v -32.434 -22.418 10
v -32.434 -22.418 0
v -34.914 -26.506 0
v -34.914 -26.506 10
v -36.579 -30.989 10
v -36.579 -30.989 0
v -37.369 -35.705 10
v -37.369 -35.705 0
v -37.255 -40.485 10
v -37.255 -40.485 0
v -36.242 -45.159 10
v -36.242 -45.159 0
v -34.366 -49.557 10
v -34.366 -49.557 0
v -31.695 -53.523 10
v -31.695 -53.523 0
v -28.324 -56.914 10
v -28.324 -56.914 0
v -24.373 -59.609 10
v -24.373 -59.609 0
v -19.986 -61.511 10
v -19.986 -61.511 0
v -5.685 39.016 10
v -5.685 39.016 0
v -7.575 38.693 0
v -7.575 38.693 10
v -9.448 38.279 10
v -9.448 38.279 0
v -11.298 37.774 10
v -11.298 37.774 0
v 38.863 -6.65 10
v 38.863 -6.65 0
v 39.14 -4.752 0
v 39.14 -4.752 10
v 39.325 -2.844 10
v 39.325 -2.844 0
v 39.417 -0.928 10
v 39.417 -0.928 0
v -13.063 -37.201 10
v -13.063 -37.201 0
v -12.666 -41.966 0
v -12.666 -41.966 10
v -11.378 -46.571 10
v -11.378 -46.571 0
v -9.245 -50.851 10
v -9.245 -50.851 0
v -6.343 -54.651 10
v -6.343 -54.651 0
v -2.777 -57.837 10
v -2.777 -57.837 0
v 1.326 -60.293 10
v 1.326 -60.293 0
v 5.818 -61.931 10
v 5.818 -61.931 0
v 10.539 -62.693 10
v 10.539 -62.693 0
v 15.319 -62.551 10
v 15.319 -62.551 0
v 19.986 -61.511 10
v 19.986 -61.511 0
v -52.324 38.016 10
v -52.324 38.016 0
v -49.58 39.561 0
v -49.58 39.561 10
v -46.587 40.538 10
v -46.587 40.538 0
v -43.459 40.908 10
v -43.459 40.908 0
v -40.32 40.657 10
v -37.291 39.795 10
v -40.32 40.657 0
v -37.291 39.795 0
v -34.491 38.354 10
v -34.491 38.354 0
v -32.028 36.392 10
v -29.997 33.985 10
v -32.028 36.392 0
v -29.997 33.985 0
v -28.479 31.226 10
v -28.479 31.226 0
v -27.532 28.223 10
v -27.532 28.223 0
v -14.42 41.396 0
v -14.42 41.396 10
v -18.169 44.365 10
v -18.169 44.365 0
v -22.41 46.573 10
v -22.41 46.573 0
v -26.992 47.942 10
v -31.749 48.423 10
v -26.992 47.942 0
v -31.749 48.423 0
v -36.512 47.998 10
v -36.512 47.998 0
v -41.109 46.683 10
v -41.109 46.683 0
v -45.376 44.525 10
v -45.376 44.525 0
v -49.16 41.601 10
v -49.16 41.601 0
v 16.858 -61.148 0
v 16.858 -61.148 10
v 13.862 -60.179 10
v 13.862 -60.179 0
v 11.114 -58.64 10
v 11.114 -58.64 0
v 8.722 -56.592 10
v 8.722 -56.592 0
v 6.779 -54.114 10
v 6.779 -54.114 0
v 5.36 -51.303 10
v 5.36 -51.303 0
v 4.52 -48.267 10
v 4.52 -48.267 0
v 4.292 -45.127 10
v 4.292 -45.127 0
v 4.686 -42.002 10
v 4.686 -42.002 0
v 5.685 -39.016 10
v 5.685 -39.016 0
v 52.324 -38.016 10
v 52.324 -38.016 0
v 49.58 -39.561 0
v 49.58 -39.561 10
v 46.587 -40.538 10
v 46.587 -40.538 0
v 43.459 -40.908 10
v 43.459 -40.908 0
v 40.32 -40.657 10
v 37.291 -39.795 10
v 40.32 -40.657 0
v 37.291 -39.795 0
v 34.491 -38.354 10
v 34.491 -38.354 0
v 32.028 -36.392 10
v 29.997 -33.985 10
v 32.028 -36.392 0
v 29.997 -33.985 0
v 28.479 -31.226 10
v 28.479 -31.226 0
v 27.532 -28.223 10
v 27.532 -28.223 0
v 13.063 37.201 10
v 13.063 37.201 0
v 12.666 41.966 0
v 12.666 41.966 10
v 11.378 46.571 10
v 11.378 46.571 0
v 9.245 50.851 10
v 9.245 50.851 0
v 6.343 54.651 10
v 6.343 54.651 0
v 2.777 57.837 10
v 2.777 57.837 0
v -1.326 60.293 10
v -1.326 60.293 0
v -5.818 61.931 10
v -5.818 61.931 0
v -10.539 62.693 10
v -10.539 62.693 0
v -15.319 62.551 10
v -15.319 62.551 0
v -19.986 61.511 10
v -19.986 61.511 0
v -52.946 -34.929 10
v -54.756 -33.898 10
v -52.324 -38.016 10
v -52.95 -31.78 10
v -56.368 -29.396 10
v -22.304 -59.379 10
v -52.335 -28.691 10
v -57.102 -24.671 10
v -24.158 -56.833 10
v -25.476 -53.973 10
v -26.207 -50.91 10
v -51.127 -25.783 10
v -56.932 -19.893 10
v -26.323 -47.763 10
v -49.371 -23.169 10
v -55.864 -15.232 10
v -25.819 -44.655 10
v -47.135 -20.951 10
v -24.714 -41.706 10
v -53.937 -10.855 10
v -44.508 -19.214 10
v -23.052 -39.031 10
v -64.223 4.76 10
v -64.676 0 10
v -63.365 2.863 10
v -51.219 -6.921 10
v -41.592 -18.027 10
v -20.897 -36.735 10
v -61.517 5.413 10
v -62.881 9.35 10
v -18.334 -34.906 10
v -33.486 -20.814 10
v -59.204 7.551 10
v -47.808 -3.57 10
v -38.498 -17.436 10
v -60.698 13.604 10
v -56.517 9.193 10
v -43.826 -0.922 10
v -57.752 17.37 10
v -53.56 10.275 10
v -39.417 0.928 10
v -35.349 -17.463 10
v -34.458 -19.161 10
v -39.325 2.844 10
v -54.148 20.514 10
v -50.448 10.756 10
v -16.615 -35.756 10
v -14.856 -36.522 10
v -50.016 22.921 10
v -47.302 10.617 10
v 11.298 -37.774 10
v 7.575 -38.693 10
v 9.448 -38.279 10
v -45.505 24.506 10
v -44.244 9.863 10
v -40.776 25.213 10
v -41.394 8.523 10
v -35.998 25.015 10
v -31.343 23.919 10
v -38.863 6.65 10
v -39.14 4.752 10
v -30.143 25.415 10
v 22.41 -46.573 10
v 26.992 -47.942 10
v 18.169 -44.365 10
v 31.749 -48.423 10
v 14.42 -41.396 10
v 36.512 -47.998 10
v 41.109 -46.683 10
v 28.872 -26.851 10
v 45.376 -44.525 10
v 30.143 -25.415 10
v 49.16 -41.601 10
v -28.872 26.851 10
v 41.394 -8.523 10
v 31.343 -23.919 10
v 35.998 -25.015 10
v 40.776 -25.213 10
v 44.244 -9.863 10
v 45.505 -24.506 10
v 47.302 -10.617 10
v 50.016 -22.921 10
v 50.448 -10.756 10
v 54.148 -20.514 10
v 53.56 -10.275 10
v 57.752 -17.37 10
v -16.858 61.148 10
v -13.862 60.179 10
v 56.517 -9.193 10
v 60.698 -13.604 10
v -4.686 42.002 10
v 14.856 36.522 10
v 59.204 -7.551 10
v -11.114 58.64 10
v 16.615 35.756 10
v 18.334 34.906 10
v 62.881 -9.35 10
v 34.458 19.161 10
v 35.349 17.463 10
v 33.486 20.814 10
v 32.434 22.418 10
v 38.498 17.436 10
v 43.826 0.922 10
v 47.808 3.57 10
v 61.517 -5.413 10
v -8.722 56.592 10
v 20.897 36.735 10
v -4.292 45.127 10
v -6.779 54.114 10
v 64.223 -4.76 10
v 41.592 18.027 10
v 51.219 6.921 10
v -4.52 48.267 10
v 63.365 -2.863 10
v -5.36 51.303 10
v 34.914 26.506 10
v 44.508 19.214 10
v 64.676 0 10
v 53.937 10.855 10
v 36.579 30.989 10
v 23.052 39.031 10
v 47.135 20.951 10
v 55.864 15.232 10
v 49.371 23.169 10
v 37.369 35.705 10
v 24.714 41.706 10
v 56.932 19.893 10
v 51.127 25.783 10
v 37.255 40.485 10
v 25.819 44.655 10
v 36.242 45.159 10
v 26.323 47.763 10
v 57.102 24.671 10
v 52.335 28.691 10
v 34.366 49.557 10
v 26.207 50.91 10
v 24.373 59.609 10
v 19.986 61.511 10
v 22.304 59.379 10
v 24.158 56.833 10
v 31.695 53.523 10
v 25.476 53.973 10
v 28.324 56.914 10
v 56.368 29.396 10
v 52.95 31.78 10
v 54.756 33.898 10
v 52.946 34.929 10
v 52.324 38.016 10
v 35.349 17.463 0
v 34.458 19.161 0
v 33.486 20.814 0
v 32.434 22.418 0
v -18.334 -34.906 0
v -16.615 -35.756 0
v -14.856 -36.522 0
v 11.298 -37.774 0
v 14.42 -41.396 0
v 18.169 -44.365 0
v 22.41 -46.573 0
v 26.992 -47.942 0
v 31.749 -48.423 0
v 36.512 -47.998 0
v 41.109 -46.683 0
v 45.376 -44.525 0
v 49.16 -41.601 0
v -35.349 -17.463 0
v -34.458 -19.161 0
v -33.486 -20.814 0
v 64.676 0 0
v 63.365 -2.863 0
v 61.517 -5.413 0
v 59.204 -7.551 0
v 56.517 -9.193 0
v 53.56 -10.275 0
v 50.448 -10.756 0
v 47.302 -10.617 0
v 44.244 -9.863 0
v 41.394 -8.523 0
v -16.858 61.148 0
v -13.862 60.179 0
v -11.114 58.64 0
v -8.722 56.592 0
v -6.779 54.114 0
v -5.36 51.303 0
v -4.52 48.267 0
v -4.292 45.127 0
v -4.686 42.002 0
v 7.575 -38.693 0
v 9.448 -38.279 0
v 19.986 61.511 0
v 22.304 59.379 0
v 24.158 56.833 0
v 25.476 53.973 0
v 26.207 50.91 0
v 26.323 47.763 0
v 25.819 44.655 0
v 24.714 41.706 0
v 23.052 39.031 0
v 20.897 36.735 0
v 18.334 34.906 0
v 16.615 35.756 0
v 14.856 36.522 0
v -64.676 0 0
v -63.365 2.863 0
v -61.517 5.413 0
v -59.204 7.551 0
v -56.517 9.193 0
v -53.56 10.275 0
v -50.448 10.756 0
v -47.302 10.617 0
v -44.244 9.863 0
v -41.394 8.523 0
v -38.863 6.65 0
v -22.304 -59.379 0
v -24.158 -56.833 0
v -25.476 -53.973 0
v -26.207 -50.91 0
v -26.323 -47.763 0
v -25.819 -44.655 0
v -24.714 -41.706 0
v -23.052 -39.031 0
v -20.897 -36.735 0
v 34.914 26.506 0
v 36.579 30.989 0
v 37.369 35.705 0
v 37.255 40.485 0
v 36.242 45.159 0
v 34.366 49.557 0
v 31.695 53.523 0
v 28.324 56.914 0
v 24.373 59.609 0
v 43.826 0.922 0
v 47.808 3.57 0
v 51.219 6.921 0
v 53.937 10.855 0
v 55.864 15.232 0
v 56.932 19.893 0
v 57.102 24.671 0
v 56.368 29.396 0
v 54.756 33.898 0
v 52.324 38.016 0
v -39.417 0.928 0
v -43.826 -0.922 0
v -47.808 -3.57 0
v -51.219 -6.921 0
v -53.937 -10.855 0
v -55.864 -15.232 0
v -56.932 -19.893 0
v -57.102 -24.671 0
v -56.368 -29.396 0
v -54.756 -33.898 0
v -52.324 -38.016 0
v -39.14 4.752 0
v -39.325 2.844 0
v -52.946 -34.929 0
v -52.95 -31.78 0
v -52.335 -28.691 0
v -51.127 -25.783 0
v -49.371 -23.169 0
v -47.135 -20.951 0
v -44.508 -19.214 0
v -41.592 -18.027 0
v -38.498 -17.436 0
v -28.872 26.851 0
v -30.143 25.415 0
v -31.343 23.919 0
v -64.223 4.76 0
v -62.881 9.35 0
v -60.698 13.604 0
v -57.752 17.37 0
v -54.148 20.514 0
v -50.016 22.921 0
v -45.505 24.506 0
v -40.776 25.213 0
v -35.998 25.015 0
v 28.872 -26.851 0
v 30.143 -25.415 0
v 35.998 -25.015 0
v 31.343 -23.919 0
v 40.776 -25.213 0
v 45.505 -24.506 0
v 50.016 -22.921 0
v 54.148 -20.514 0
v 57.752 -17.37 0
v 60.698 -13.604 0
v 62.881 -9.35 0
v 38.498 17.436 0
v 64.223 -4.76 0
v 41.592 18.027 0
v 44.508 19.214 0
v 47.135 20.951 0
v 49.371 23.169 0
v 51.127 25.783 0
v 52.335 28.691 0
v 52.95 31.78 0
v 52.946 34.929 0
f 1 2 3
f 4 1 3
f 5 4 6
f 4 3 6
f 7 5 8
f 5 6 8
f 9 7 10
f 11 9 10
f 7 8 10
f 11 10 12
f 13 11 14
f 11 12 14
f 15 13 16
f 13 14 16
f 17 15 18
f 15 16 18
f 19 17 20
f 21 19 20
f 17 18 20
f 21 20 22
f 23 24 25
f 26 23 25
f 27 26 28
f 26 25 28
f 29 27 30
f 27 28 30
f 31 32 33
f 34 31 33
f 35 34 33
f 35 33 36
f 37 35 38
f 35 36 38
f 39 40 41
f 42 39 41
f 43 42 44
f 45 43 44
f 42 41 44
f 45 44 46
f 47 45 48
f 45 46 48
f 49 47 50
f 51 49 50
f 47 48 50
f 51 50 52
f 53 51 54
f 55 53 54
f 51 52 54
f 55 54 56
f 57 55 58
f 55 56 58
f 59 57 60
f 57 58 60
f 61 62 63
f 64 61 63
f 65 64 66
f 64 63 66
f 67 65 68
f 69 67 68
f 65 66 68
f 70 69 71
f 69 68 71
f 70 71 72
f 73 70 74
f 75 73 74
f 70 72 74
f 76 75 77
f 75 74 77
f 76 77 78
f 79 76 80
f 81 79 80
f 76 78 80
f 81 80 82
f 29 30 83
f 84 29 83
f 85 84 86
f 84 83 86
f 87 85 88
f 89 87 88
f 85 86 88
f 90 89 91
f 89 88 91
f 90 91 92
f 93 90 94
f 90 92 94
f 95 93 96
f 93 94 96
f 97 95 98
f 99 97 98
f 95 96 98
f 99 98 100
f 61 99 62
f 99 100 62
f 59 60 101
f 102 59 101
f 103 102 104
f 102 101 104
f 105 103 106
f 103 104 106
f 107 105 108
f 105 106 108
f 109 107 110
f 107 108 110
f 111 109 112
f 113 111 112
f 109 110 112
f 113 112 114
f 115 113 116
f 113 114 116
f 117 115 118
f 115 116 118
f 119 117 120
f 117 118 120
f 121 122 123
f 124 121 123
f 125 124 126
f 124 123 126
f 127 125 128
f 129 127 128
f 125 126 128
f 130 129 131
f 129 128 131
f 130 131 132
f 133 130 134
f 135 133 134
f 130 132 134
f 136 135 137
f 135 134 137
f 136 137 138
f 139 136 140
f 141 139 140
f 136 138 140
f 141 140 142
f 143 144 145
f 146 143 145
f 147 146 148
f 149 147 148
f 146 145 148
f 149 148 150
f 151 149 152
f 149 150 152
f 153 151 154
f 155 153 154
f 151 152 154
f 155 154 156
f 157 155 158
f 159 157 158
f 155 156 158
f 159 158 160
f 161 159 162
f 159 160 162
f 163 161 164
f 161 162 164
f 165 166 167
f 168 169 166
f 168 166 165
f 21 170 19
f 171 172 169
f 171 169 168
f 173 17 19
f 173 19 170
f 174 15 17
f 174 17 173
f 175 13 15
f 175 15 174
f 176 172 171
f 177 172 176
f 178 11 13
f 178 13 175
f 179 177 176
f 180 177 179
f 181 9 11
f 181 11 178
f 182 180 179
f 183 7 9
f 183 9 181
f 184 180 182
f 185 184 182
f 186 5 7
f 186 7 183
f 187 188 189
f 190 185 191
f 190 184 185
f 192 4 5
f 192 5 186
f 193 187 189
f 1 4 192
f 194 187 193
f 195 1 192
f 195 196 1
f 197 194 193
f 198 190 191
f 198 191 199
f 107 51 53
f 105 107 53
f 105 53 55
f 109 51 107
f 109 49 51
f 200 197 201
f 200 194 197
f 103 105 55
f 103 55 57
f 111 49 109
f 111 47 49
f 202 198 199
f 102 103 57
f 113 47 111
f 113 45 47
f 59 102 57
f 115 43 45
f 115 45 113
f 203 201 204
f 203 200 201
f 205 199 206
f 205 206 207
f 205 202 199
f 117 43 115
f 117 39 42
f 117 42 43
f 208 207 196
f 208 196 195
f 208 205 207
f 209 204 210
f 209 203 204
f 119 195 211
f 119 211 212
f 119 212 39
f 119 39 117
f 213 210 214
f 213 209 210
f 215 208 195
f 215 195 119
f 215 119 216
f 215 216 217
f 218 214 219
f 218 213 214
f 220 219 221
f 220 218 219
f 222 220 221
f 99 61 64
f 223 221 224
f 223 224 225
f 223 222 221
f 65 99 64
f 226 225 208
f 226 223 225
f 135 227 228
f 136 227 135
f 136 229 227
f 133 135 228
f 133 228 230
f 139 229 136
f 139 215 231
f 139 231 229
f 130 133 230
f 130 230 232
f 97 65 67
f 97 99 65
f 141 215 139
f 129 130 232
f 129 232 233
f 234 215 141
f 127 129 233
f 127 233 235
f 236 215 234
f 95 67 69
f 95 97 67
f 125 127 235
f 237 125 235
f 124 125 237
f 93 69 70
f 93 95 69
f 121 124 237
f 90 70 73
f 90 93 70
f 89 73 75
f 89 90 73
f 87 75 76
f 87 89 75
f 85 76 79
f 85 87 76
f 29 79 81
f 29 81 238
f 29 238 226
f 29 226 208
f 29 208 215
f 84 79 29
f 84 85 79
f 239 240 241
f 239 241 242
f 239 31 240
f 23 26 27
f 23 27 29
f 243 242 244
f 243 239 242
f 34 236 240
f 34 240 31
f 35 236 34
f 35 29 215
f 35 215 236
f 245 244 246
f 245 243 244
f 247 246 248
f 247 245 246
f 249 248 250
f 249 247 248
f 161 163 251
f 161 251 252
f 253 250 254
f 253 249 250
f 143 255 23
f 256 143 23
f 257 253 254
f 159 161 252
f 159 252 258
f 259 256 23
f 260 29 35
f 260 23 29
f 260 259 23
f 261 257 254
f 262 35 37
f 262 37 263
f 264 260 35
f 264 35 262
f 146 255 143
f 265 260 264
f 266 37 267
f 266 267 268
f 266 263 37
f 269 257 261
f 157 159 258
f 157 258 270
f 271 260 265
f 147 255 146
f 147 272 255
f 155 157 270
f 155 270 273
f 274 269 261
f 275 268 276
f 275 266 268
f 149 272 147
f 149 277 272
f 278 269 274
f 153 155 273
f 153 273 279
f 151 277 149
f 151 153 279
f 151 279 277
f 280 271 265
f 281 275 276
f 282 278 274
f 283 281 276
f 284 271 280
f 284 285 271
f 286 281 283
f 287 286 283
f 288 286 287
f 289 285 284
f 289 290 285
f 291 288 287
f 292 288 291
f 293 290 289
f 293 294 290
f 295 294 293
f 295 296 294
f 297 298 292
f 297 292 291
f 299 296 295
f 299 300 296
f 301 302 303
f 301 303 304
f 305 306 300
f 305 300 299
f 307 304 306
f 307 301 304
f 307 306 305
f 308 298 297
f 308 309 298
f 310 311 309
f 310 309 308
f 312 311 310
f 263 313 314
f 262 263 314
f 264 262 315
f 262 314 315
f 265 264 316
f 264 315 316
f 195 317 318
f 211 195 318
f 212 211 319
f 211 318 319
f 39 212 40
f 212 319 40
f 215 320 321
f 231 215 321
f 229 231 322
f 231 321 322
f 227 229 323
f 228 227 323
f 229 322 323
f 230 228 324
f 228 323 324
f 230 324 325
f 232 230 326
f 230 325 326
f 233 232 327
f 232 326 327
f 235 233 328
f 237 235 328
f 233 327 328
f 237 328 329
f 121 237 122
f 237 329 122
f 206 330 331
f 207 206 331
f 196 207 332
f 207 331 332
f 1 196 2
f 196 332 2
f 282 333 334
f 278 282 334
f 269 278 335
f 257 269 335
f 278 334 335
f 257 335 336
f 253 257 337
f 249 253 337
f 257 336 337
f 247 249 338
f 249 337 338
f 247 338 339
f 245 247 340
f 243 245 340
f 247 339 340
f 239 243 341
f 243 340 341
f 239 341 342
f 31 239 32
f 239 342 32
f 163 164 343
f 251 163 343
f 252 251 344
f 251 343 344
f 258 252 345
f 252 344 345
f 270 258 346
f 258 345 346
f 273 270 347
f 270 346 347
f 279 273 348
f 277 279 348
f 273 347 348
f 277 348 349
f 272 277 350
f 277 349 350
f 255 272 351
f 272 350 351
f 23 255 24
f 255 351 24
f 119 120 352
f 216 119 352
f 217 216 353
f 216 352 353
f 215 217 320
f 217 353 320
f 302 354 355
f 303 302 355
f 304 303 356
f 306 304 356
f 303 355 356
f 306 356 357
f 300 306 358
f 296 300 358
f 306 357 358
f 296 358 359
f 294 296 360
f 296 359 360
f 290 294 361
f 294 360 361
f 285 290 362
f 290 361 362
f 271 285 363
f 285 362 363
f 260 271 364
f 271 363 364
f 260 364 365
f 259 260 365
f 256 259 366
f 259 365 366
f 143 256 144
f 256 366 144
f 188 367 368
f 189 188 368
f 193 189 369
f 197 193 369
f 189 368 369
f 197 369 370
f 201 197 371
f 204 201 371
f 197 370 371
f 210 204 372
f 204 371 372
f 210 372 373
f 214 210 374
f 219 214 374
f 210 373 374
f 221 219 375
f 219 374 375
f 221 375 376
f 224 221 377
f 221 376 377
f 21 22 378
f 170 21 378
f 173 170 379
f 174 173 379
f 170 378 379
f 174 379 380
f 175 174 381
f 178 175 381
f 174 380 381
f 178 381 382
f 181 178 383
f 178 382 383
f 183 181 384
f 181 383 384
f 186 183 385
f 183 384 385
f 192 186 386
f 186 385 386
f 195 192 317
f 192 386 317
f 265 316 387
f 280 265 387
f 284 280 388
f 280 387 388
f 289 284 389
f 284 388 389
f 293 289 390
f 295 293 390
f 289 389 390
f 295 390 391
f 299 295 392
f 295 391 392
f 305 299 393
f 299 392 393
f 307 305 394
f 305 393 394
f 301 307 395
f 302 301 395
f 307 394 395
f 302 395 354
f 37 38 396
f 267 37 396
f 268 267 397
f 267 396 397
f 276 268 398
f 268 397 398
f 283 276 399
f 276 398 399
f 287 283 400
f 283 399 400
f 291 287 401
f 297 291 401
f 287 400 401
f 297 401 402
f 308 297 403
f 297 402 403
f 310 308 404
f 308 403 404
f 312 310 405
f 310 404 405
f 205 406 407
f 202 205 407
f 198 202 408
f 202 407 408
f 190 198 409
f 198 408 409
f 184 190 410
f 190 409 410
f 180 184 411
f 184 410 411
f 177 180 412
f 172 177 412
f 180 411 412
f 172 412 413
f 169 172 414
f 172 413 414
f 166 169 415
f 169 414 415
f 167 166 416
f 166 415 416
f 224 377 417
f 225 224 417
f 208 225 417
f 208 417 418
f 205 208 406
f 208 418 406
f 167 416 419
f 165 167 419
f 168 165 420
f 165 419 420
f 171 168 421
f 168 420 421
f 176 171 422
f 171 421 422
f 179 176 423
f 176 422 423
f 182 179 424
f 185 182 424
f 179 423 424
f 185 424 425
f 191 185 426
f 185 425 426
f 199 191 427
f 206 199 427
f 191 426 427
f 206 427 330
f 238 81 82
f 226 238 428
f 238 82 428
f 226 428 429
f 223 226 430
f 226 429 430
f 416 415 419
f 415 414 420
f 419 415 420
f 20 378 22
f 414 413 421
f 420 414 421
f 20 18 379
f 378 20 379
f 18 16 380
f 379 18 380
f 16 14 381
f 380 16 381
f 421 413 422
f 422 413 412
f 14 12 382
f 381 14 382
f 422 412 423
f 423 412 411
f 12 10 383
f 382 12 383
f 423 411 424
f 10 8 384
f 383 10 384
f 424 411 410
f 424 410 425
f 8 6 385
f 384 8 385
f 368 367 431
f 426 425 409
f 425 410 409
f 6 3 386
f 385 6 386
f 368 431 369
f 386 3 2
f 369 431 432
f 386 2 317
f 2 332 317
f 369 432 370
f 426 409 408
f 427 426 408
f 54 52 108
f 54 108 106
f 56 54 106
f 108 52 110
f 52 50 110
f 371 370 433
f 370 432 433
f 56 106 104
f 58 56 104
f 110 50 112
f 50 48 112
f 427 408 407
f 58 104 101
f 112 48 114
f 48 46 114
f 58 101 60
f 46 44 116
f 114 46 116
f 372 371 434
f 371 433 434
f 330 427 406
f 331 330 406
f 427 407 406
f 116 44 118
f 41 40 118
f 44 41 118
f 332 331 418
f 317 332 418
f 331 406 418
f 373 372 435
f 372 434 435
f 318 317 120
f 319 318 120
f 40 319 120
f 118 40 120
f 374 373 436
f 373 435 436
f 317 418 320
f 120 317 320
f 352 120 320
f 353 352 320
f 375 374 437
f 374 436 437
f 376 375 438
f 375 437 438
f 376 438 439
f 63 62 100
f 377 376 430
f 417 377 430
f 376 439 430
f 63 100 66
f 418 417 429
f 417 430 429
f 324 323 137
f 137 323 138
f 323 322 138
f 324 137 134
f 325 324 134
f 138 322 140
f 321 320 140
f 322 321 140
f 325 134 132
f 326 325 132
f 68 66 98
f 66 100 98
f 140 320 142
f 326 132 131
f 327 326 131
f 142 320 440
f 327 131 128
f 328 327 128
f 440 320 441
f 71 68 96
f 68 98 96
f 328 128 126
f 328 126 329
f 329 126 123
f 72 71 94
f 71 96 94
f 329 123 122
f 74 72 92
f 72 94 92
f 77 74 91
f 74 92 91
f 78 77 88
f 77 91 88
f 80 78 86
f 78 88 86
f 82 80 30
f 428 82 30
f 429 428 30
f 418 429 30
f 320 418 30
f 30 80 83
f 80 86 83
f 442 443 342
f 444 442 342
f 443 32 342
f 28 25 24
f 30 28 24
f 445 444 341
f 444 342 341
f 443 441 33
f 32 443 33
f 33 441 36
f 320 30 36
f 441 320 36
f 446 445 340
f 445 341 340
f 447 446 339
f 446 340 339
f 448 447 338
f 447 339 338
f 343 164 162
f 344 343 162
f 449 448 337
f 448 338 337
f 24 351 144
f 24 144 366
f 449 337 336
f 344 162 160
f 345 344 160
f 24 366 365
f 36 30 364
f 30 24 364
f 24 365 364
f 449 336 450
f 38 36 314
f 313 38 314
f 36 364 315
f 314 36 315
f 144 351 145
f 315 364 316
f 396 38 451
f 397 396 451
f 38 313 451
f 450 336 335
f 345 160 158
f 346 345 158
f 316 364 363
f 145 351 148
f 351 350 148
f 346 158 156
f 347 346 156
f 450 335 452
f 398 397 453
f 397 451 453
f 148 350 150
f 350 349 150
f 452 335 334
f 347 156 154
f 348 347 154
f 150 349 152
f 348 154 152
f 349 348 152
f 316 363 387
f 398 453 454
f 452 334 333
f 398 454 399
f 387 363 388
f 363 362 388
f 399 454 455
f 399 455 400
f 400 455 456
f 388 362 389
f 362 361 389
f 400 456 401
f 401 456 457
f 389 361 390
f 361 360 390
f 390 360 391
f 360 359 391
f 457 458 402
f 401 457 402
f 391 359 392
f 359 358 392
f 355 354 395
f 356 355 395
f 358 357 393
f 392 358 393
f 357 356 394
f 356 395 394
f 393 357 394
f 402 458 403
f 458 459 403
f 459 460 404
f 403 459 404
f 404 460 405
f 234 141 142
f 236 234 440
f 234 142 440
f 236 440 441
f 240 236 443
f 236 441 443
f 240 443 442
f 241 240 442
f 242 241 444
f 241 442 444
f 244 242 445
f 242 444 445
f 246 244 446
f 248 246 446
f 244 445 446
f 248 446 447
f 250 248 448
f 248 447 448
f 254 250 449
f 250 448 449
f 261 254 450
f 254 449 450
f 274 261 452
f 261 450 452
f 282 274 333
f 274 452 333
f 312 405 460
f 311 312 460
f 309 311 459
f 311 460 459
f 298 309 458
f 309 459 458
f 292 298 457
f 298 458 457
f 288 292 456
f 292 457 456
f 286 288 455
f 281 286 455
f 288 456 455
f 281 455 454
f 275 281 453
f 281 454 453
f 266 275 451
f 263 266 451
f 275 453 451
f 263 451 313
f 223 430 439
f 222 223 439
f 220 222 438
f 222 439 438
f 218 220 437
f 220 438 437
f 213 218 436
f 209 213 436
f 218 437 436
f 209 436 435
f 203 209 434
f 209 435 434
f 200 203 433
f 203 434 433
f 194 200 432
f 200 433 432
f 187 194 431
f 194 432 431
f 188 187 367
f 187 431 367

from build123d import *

# Parameters (mm, degrees)
F1_DEPTH = 10


with BuildPart() as f1:
    # F0 (on Top) → F1 (new body)
    with BuildSketch(Plane.XY):
        with BuildLine():
            ThreePointArc((-64.676278, 0), (-53.560022, 10.275162), (-38.86285, 6.649806))
            ThreePointArc((-38.86285, 6.649806), (-39.244215, 3.79902), (-39.416745, 0.928018))
            ThreePointArc((-39.416745, 0.928018), (-55.864178, -15.231576), (-52.324208, -38.015762))
            ThreePointArc((-52.324208, -38.015762), (-49.370557, -23.16901), (-35.349364, -17.463204))
            ThreePointArc((-35.349364, -17.463204), (-33.982245, -19.993699), (-32.434292, -22.417799))
            ThreePointArc((-32.434292, -22.417799), (-36.242173, -45.158744), (-19.986069, -61.510795))
            ThreePointArc((-19.986069, -61.510795), (-26.323217, -47.763408), (-18.333622, -34.905863))
            ThreePointArc((-18.333622, -34.905863), (-15.740212, -36.149505), (-13.063042, -37.200779))
            ThreePointArc((-13.063042, -37.200779), (-2.776891, -57.836806), (19.986069, -61.510795))
            ThreePointArc((19.986069, -61.510795), (6.778697, -54.113808), (5.68494, -39.015669))
            ThreePointArc((5.68494, -39.015669), (8.514047, -38.497429), (11.297846, -37.774325))
            ThreePointArc((11.297846, -37.774325), (31.74907, -48.423174), (52.324208, -38.015762))
            ThreePointArc((52.324208, -38.015762), (37.291379, -39.794572), (27.532048, -28.222816))
            ThreePointArc((27.532048, -28.222816), (29.516229, -26.140643), (31.343341, -23.919364))
            ThreePointArc((31.343341, -23.919364), (54.147965, -20.513536), (64.676278, 0))
            ThreePointArc((64.676278, 0), (53.560022, -10.275162), (38.86285, -6.649806))
            ThreePointArc((38.86285, -6.649806), (39.244215, -3.79902), (39.416745, -0.928018))
            ThreePointArc((39.416745, -0.928018), (55.864178, 15.231576), (52.324208, 38.015762))
            ThreePointArc((52.324208, 38.015762), (49.370557, 23.16901), (35.349364, 17.463204))
            ThreePointArc((35.349364, 17.463204), (33.982245, 19.993699), (32.434292, 22.417799))
            ThreePointArc((32.434292, 22.417799), (36.242173, 45.158744), (19.986069, 61.510795))
            ThreePointArc((19.986069, 61.510795), (26.323217, 47.763408), (18.333622, 34.905863))
            ThreePointArc((18.333622, 34.905863), (15.740212, 36.149505), (13.063042, 37.200779))
            ThreePointArc((13.063042, 37.200779), (2.776891, 57.836806), (-19.986069, 61.510795))
            ThreePointArc((-19.986069, 61.510795), (-6.778697, 54.113808), (-5.68494, 39.015669))
            ThreePointArc((-5.68494, 39.015669), (-8.514047, 38.497429), (-11.297846, 37.774325))
            ThreePointArc((-11.297846, 37.774325), (-31.74907, 48.423174), (-52.324208, 38.015762))
            ThreePointArc((-52.324208, 38.015762), (-37.291379, 39.794572), (-27.532048, 28.222816))
            ThreePointArc((-27.532048, 28.222816), (-29.516229, 26.140643), (-31.343341, 23.919364))
            ThreePointArc((-31.343341, 23.919364), (-54.147965, 20.513536), (-64.676278, 0))
        make_face()
    extrude(amount=F1_DEPTH)


solid = f1.part
